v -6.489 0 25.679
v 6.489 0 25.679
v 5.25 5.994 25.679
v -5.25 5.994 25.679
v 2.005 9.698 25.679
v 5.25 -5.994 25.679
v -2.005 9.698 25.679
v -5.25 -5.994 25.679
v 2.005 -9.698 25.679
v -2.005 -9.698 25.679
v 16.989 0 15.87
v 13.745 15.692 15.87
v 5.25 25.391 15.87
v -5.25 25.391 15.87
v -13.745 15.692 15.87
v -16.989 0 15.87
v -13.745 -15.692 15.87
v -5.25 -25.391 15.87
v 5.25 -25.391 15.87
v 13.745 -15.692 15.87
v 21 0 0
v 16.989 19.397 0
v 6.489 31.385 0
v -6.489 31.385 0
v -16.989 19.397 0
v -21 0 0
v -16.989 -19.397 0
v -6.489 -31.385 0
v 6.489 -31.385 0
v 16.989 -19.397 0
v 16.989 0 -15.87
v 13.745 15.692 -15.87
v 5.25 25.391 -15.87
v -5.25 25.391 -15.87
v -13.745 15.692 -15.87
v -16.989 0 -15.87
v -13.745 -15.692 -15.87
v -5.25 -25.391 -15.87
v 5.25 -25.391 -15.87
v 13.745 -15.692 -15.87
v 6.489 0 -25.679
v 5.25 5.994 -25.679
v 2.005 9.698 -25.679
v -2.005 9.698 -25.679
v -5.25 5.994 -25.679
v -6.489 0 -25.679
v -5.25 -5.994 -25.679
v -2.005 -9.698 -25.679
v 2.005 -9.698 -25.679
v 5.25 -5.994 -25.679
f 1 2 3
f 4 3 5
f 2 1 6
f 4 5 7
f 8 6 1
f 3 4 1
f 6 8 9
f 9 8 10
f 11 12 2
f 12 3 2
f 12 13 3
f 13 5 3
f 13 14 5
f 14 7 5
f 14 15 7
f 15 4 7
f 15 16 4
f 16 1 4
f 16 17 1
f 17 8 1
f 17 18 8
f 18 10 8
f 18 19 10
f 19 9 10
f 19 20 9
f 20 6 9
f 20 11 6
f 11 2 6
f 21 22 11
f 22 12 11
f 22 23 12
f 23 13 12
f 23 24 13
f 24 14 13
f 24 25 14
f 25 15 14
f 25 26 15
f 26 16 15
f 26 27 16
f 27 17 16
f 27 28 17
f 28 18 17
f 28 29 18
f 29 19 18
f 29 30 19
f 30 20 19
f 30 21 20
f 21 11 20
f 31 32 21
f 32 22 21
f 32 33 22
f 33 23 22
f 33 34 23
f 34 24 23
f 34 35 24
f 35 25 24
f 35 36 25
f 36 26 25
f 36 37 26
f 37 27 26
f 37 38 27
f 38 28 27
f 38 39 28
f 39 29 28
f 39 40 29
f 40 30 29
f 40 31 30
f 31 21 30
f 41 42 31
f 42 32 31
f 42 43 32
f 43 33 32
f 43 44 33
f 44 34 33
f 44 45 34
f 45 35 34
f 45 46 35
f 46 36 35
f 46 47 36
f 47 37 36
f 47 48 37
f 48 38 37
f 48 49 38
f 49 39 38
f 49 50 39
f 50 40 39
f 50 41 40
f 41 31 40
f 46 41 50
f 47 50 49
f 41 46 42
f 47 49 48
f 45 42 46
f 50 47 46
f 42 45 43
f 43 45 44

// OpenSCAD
// Generated by SolidPython 1.0.1 on 2020-07-29 00:46:47


scale(v = [7, 11, 9]) {
	sphere(r = 3);
}
/***********************************************
*********      SolidPython code:      **********
************************************************
 
# import packages: SolidPython
from solid import *
from solid.utils import *
from itertools import chain, combinations, permutations


class Resize:

    def __init__(self, scad_file):
        self.scad_file = scad_file
        #self.scad_file = import_scad(scad_file)
        # cone/cylinder param:
        self.r1 = 0
        self.r2 = 0
        self.h = 0
        # rectangular prism param:
        self.w = 0
        self.l = 0
        # ellipse param:
        self.r = 0

    # import OpenScad code (file name corresponds to shape)


    # classify shape + parameters
    def assign(self, param1, param2, param3):
        if self.scad_file == 'cone.scad':
            self.r1 = param1
            self.r2 = param2
            self.h = param3
        elif self.scad_file == 'cylinder.scad':
            self.r1 = param1
            self.r2 = param2
            self.h = param3
        elif self.scad_file == 'rectangularPrism.scad':
            self.h = param1
            self.l = param2
            self.w = param3
        else:
            self.r = param1
            self.h = param2

    # resize parameters
    def iterate(self):
        x = range(3, 20, 2)
        i = 1
        if self.scad_file == 'cone.scad':
            tempList = list(permutations(x, 2))
            for temp in tempList:
                param1 = temp[0]
                param2 = temp[1]
                filepath = 'produced_scad_files/' + 'cone' + str(param1) + '_' + str(param2) + '_' + '.scad'
                scad_render_to_file(cylinder(h=param1, r1=param2, r2=0), filepath)

        elif self.scad_file == 'cylinder.scad':
            tempList = list(permutations(x, 3))
            for temp in tempList:
                param1 = temp[0]
                param2 = temp[1]
                filepath = 'produced_scad_files/' + 'cylinder' + str(param1) + '_' + str(param2) + '_' + '.scad'
                scad_render_to_file(cylinder(h=param1, r1=param2, r2=param2), filepath)

        elif self.scad_file == 'rectangularPrism.scad':
            tempList = list(permutations(x, 3))
            for temp in tempList:
                param1 = temp[0]
                param2 = temp[1]
                param3 = temp[2]
                filepath = 'produced_scad_files/' + 'rectangularPrism' + str(param1) + '_' + str(param2) + '_' + str(
                    param3) + '.scad'
                scad_render_to_file(cube(size=(param1, param2, param3)), filepath)

        elif self.scad_file == 'ellipse.scad':
            tempList = list(permutations(x, 4))
            for temp in tempList:
                param1 = temp[0]
                param2 = temp[1]
                param3 = temp[2]
                param4 = temp[3]
                filepath = 'produced_scad_files/' + 'ellipse' + str(param1) + '_' + str(param2) + '_' + str(param3) + '_' + str(param4) + '.scad'
                scad_render_to_file(scale([param1, param2, param3])(sphere(r=param4)), filepath)

    def render_to_scadfile(self):
        scad_render_to_file(scad, 'example.scad') 
 
************************************************/
